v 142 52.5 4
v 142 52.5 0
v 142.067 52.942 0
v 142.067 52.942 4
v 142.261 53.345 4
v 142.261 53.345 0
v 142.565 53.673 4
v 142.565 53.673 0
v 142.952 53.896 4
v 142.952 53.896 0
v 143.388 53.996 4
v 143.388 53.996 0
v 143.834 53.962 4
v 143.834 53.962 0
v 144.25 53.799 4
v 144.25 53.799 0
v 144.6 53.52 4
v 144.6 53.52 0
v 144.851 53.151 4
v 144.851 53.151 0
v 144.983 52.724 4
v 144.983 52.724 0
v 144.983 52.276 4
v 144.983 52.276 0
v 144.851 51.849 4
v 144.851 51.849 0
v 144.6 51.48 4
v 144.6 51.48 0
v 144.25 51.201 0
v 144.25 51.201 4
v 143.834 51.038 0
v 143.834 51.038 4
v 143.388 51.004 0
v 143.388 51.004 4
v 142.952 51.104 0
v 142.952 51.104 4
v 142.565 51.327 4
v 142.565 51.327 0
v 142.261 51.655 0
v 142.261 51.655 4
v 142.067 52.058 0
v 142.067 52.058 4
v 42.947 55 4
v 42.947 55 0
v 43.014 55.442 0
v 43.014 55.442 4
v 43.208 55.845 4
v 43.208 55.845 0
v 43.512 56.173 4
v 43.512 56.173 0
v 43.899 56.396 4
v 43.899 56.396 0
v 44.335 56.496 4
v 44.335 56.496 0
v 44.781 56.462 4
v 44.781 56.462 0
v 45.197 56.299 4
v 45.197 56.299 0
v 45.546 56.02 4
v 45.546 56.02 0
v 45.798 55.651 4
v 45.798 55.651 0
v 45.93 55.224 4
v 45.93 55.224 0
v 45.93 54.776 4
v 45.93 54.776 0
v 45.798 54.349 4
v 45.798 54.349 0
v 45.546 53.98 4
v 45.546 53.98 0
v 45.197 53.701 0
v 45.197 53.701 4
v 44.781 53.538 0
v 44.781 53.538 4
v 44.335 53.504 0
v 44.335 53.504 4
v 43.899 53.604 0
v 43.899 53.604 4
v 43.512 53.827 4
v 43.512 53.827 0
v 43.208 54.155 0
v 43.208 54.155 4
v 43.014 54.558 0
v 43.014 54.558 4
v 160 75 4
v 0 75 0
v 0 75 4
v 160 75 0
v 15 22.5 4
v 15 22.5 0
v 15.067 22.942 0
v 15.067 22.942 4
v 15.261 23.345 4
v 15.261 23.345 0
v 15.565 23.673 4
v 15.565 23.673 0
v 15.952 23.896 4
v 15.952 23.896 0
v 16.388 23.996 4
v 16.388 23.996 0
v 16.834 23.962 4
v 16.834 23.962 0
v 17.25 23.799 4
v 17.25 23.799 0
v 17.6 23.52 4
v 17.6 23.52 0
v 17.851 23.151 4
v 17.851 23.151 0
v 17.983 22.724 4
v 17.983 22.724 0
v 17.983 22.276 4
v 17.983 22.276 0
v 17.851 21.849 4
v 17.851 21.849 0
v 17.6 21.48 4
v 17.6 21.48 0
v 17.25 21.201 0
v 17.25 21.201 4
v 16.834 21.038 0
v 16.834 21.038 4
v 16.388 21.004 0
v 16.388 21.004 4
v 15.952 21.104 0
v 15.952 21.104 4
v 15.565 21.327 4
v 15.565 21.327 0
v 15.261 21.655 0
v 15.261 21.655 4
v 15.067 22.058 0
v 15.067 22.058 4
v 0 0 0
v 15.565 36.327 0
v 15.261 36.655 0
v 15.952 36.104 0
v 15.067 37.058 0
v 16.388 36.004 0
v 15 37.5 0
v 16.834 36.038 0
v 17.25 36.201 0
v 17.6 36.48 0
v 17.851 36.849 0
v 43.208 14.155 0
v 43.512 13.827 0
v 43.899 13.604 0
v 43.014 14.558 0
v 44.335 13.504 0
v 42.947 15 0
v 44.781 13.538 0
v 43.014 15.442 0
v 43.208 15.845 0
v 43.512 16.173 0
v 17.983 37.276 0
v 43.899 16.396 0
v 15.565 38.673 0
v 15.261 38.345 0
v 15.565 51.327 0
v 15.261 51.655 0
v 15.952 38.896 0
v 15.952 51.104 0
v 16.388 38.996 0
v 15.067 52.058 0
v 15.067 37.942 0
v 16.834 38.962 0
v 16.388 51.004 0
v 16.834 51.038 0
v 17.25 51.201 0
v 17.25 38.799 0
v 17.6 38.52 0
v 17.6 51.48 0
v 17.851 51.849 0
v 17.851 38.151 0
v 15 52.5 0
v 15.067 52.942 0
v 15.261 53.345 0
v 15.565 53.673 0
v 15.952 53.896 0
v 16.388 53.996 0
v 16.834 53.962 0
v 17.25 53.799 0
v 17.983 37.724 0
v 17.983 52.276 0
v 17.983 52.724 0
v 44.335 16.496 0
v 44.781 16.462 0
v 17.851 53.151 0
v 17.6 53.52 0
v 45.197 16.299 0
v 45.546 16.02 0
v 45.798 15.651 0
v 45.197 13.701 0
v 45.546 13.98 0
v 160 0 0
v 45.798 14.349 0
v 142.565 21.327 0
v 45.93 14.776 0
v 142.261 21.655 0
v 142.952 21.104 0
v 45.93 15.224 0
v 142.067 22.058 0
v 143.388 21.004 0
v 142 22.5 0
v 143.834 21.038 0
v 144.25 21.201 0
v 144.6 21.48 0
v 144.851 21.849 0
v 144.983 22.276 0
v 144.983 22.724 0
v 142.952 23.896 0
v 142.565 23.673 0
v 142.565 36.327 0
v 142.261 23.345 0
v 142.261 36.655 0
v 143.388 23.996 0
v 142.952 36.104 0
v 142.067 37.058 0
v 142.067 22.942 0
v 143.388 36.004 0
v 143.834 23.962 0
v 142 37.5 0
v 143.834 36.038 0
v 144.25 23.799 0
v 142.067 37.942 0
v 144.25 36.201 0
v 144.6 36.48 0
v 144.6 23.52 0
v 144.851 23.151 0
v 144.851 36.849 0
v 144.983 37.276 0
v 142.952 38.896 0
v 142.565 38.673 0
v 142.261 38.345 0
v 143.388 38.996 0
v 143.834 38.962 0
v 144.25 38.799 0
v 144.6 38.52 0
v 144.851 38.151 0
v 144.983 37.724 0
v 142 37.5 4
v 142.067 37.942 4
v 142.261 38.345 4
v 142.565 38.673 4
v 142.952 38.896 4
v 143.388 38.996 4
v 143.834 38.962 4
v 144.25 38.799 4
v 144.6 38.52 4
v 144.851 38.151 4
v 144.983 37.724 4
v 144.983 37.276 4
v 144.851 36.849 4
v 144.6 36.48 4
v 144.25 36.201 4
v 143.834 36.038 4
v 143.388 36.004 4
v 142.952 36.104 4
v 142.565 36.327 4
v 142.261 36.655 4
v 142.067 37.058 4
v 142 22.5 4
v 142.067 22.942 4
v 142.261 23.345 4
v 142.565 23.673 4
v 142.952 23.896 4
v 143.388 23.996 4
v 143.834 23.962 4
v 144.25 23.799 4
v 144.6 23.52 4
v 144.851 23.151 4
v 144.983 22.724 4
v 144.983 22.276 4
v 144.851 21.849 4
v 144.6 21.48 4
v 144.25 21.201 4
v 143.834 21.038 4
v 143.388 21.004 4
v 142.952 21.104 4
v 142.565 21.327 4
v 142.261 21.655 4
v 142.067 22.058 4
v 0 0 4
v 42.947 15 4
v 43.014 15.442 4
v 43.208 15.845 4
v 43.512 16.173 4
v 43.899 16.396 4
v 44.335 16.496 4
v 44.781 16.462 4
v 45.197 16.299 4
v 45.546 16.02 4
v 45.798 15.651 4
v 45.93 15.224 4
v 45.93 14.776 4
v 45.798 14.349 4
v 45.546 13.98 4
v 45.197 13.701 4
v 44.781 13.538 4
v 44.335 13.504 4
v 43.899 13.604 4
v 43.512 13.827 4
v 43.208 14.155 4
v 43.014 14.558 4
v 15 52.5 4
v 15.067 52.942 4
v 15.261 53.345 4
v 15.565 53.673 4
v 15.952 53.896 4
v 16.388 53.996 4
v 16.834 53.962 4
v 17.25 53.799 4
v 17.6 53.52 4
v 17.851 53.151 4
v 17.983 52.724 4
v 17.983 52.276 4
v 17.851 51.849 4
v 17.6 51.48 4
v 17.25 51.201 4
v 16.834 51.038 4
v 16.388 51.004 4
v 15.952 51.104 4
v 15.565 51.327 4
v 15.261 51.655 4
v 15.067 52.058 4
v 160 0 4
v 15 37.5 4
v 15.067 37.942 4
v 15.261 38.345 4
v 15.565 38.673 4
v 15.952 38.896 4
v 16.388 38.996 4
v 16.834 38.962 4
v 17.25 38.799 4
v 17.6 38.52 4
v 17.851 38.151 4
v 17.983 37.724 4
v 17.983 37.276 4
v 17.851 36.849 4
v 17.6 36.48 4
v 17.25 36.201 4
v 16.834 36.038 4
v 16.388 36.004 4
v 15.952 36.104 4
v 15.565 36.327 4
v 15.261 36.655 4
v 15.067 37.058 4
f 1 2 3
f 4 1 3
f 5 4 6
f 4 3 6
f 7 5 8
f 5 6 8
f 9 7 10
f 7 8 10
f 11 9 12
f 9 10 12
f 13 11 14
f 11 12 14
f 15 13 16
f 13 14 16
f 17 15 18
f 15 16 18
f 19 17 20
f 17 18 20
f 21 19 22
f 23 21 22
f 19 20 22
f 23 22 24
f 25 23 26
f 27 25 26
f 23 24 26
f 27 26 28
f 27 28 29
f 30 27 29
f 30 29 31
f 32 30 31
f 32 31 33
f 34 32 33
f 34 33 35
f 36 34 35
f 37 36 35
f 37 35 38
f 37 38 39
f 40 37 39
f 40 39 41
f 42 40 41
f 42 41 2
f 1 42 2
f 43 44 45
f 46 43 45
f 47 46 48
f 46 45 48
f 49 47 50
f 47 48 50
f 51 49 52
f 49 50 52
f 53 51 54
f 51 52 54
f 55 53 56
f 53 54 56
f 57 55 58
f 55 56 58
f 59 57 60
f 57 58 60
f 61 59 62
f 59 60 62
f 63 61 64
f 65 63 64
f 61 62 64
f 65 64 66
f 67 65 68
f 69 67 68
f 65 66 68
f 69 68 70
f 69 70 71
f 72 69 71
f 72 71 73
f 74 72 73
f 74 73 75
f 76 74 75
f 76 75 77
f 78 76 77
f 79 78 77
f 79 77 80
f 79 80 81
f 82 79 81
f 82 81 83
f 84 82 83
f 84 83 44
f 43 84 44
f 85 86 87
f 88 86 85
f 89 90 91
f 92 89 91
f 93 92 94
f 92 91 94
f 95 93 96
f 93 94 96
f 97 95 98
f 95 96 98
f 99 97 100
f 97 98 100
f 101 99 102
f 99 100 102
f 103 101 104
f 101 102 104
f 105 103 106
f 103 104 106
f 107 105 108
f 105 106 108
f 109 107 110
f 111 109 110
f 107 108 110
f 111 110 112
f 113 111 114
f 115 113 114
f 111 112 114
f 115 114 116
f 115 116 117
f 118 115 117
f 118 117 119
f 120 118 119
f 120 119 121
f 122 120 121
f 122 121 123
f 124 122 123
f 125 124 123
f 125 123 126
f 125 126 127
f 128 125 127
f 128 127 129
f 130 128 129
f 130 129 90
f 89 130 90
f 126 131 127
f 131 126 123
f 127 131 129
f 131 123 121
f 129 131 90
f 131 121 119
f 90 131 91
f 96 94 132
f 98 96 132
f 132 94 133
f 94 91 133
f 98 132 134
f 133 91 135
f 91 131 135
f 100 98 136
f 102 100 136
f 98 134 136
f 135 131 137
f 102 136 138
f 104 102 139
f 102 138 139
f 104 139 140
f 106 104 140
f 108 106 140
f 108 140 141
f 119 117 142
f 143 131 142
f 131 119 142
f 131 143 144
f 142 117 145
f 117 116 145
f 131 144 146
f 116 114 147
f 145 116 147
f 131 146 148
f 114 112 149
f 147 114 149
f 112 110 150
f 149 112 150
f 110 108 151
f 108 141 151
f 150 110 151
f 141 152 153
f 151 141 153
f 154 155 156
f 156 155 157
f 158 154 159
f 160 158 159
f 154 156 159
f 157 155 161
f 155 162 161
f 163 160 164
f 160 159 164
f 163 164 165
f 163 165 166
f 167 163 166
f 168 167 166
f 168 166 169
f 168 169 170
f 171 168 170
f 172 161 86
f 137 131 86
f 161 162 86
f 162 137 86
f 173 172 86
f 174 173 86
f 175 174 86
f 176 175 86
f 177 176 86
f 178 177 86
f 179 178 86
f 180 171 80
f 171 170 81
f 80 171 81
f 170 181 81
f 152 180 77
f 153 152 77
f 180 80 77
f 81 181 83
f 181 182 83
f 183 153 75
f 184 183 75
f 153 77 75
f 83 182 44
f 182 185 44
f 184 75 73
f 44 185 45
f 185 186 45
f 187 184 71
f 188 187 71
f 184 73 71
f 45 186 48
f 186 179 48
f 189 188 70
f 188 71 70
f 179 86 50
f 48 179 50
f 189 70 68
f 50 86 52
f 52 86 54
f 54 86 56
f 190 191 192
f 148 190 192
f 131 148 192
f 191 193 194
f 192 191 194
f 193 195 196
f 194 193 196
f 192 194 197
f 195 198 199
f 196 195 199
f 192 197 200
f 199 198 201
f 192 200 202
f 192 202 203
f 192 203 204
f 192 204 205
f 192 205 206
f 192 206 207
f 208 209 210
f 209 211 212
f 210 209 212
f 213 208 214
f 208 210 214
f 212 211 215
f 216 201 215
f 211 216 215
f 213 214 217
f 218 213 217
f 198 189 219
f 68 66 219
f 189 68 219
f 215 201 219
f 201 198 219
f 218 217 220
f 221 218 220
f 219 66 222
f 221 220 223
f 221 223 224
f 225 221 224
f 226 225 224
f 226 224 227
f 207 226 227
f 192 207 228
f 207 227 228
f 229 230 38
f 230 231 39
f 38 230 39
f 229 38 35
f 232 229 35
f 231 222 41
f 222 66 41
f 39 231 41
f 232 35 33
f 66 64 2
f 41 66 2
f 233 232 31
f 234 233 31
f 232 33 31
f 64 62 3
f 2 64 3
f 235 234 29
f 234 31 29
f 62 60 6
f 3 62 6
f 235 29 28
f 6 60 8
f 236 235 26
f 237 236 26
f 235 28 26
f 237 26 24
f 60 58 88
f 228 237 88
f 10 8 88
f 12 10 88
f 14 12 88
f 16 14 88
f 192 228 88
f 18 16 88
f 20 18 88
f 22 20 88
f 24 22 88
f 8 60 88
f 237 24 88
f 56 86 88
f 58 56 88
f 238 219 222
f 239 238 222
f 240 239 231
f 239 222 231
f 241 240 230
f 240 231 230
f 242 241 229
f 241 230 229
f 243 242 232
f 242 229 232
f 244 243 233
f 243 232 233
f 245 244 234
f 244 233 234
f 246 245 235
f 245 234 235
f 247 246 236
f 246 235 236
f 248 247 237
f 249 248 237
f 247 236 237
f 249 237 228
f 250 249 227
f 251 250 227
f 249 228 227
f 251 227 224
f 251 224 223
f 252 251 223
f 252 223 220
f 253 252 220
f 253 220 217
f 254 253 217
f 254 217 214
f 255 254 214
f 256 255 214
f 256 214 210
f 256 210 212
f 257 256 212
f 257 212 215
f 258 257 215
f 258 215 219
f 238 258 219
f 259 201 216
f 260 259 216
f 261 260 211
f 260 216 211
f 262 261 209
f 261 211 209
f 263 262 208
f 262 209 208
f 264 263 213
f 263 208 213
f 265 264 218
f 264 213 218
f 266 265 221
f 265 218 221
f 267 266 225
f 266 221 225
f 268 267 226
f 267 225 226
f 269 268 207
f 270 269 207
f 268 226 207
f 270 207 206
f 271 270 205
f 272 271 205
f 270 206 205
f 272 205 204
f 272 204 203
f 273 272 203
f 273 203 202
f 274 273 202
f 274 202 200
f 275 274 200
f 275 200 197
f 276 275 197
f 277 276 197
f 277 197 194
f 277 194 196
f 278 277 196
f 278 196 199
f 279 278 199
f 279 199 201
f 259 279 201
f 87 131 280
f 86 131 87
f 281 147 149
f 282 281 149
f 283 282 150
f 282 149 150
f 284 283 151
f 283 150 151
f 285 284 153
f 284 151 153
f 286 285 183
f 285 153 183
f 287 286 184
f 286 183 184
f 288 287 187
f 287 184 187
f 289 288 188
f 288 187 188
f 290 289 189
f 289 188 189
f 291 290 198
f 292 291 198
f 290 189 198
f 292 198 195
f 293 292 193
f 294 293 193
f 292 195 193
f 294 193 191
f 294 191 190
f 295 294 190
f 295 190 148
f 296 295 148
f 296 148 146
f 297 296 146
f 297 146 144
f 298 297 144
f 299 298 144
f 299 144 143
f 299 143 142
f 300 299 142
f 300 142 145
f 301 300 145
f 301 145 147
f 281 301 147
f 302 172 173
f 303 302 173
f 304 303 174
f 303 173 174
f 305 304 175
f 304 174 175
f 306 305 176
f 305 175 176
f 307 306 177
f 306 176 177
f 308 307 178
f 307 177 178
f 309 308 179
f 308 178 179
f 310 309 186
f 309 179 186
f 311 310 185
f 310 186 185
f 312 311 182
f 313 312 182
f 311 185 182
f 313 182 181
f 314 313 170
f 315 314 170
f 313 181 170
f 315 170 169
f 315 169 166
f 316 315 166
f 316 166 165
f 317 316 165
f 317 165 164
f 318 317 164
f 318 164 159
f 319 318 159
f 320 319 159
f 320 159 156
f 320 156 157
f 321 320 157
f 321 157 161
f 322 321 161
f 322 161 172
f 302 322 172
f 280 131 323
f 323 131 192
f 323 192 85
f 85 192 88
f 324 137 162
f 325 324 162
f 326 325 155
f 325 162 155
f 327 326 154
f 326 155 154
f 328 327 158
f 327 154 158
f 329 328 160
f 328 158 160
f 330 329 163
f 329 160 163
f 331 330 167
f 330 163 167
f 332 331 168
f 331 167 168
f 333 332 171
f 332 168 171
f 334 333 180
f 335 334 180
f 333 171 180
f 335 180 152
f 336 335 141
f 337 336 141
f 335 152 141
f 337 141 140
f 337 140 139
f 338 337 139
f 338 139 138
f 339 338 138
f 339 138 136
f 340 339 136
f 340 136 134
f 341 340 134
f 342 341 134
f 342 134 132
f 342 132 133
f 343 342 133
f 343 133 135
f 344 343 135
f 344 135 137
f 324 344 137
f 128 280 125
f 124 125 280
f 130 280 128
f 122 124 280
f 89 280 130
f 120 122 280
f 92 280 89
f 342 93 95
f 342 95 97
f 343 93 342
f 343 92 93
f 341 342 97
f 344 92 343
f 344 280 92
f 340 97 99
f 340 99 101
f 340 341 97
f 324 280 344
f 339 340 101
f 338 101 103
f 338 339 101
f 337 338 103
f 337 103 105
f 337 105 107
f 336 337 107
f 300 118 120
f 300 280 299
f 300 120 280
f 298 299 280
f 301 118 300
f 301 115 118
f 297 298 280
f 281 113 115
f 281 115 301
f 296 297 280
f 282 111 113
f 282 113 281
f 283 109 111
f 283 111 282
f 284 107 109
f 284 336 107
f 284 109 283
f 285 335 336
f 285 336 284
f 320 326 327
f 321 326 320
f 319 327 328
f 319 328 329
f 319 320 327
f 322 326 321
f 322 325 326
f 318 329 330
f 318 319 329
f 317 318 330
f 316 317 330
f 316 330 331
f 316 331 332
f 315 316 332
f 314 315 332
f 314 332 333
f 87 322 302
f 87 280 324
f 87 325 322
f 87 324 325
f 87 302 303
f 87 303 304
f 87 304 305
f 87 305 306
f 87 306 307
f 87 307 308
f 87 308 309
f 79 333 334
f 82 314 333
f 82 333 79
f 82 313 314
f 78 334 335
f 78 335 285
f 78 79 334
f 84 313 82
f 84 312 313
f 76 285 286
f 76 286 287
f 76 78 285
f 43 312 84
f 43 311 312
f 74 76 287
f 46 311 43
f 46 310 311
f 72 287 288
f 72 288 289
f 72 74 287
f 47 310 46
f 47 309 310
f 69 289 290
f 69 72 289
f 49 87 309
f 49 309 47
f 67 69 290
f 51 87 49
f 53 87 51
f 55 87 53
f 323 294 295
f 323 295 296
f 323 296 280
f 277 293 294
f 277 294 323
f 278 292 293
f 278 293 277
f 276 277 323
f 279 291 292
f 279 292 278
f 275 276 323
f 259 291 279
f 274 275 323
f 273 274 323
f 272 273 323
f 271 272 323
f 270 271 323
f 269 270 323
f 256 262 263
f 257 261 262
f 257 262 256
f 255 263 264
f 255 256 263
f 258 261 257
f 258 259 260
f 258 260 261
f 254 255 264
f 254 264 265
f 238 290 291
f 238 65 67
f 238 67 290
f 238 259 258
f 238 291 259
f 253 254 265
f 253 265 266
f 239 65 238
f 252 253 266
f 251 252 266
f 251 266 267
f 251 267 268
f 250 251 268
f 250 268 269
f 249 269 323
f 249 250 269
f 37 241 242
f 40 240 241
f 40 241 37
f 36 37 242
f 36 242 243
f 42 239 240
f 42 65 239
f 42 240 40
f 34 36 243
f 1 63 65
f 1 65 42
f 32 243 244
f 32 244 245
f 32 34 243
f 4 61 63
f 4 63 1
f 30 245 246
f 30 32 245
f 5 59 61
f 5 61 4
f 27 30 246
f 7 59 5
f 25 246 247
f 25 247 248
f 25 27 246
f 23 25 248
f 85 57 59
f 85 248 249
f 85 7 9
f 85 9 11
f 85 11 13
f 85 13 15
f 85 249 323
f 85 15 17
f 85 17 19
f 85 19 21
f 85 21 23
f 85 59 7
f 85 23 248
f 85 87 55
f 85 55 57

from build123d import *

# Parameters (mm, degrees)
SKETCH1_W                       = 160
SKETCH1_H                       = 75
BOSS_EXTRUDE1_DEPTH             = 4
F_3_0MM_DOWEL_HOLE1_D           = 3
F_3_0MM_DOWEL_HOLE2_D           = 3
F_3_0MM_PRESS_DOWEL_HOLE1_D     = 3
F_3_0MM_PRESS_DOWEL_HOLE1_DEPTH = 6
F_3_0MM_PRESS_DOWEL_HOLE1_TIP   = 0.901290929


with BuildPart() as part:
    # Sketch1 → Boss-Extrude1 (new body)
    with BuildSketch(Plane.XY):
        with Locations((80, 37.5)):
            Rectangle(SKETCH1_W, SKETCH1_H)
    extrude(amount=BOSS_EXTRUDE1_DEPTH)

    # Ø3.0mm Dowel Hole1 (through all)
    with Locations(Plane.XY.offset(4)):
        with Locations((16.5, 52.5), (16.5, 22.5), (143.5, 52.5), (143.5, 22.5)):
            Hole(F_3_0MM_DOWEL_HOLE1_D / 2)

    # Ø3.0mm Dowel Hole2 (through all)
    with Locations(Plane.XY.offset(4)):
        with Locations((16.5, 37.5), (143.5, 37.5)):
            Hole(F_3_0MM_DOWEL_HOLE2_D / 2)

    # Ø3.0mm Press Dowel Hole1
    with Locations(Plane.XY.offset(4)):
        with Locations((44.446877451, 15), (44.446877451, 55)):
            Hole(F_3_0MM_PRESS_DOWEL_HOLE1_D / 2, depth=F_3_0MM_PRESS_DOWEL_HOLE1_DEPTH)
            with Locations((0, 0, -(F_3_0MM_PRESS_DOWEL_HOLE1_DEPTH + F_3_0MM_PRESS_DOWEL_HOLE1_TIP / 2))):  # 118° drill point
                Cone(0, F_3_0MM_PRESS_DOWEL_HOLE1_D / 2, F_3_0MM_PRESS_DOWEL_HOLE1_TIP, mode=Mode.SUBTRACT)


solid = part.part
